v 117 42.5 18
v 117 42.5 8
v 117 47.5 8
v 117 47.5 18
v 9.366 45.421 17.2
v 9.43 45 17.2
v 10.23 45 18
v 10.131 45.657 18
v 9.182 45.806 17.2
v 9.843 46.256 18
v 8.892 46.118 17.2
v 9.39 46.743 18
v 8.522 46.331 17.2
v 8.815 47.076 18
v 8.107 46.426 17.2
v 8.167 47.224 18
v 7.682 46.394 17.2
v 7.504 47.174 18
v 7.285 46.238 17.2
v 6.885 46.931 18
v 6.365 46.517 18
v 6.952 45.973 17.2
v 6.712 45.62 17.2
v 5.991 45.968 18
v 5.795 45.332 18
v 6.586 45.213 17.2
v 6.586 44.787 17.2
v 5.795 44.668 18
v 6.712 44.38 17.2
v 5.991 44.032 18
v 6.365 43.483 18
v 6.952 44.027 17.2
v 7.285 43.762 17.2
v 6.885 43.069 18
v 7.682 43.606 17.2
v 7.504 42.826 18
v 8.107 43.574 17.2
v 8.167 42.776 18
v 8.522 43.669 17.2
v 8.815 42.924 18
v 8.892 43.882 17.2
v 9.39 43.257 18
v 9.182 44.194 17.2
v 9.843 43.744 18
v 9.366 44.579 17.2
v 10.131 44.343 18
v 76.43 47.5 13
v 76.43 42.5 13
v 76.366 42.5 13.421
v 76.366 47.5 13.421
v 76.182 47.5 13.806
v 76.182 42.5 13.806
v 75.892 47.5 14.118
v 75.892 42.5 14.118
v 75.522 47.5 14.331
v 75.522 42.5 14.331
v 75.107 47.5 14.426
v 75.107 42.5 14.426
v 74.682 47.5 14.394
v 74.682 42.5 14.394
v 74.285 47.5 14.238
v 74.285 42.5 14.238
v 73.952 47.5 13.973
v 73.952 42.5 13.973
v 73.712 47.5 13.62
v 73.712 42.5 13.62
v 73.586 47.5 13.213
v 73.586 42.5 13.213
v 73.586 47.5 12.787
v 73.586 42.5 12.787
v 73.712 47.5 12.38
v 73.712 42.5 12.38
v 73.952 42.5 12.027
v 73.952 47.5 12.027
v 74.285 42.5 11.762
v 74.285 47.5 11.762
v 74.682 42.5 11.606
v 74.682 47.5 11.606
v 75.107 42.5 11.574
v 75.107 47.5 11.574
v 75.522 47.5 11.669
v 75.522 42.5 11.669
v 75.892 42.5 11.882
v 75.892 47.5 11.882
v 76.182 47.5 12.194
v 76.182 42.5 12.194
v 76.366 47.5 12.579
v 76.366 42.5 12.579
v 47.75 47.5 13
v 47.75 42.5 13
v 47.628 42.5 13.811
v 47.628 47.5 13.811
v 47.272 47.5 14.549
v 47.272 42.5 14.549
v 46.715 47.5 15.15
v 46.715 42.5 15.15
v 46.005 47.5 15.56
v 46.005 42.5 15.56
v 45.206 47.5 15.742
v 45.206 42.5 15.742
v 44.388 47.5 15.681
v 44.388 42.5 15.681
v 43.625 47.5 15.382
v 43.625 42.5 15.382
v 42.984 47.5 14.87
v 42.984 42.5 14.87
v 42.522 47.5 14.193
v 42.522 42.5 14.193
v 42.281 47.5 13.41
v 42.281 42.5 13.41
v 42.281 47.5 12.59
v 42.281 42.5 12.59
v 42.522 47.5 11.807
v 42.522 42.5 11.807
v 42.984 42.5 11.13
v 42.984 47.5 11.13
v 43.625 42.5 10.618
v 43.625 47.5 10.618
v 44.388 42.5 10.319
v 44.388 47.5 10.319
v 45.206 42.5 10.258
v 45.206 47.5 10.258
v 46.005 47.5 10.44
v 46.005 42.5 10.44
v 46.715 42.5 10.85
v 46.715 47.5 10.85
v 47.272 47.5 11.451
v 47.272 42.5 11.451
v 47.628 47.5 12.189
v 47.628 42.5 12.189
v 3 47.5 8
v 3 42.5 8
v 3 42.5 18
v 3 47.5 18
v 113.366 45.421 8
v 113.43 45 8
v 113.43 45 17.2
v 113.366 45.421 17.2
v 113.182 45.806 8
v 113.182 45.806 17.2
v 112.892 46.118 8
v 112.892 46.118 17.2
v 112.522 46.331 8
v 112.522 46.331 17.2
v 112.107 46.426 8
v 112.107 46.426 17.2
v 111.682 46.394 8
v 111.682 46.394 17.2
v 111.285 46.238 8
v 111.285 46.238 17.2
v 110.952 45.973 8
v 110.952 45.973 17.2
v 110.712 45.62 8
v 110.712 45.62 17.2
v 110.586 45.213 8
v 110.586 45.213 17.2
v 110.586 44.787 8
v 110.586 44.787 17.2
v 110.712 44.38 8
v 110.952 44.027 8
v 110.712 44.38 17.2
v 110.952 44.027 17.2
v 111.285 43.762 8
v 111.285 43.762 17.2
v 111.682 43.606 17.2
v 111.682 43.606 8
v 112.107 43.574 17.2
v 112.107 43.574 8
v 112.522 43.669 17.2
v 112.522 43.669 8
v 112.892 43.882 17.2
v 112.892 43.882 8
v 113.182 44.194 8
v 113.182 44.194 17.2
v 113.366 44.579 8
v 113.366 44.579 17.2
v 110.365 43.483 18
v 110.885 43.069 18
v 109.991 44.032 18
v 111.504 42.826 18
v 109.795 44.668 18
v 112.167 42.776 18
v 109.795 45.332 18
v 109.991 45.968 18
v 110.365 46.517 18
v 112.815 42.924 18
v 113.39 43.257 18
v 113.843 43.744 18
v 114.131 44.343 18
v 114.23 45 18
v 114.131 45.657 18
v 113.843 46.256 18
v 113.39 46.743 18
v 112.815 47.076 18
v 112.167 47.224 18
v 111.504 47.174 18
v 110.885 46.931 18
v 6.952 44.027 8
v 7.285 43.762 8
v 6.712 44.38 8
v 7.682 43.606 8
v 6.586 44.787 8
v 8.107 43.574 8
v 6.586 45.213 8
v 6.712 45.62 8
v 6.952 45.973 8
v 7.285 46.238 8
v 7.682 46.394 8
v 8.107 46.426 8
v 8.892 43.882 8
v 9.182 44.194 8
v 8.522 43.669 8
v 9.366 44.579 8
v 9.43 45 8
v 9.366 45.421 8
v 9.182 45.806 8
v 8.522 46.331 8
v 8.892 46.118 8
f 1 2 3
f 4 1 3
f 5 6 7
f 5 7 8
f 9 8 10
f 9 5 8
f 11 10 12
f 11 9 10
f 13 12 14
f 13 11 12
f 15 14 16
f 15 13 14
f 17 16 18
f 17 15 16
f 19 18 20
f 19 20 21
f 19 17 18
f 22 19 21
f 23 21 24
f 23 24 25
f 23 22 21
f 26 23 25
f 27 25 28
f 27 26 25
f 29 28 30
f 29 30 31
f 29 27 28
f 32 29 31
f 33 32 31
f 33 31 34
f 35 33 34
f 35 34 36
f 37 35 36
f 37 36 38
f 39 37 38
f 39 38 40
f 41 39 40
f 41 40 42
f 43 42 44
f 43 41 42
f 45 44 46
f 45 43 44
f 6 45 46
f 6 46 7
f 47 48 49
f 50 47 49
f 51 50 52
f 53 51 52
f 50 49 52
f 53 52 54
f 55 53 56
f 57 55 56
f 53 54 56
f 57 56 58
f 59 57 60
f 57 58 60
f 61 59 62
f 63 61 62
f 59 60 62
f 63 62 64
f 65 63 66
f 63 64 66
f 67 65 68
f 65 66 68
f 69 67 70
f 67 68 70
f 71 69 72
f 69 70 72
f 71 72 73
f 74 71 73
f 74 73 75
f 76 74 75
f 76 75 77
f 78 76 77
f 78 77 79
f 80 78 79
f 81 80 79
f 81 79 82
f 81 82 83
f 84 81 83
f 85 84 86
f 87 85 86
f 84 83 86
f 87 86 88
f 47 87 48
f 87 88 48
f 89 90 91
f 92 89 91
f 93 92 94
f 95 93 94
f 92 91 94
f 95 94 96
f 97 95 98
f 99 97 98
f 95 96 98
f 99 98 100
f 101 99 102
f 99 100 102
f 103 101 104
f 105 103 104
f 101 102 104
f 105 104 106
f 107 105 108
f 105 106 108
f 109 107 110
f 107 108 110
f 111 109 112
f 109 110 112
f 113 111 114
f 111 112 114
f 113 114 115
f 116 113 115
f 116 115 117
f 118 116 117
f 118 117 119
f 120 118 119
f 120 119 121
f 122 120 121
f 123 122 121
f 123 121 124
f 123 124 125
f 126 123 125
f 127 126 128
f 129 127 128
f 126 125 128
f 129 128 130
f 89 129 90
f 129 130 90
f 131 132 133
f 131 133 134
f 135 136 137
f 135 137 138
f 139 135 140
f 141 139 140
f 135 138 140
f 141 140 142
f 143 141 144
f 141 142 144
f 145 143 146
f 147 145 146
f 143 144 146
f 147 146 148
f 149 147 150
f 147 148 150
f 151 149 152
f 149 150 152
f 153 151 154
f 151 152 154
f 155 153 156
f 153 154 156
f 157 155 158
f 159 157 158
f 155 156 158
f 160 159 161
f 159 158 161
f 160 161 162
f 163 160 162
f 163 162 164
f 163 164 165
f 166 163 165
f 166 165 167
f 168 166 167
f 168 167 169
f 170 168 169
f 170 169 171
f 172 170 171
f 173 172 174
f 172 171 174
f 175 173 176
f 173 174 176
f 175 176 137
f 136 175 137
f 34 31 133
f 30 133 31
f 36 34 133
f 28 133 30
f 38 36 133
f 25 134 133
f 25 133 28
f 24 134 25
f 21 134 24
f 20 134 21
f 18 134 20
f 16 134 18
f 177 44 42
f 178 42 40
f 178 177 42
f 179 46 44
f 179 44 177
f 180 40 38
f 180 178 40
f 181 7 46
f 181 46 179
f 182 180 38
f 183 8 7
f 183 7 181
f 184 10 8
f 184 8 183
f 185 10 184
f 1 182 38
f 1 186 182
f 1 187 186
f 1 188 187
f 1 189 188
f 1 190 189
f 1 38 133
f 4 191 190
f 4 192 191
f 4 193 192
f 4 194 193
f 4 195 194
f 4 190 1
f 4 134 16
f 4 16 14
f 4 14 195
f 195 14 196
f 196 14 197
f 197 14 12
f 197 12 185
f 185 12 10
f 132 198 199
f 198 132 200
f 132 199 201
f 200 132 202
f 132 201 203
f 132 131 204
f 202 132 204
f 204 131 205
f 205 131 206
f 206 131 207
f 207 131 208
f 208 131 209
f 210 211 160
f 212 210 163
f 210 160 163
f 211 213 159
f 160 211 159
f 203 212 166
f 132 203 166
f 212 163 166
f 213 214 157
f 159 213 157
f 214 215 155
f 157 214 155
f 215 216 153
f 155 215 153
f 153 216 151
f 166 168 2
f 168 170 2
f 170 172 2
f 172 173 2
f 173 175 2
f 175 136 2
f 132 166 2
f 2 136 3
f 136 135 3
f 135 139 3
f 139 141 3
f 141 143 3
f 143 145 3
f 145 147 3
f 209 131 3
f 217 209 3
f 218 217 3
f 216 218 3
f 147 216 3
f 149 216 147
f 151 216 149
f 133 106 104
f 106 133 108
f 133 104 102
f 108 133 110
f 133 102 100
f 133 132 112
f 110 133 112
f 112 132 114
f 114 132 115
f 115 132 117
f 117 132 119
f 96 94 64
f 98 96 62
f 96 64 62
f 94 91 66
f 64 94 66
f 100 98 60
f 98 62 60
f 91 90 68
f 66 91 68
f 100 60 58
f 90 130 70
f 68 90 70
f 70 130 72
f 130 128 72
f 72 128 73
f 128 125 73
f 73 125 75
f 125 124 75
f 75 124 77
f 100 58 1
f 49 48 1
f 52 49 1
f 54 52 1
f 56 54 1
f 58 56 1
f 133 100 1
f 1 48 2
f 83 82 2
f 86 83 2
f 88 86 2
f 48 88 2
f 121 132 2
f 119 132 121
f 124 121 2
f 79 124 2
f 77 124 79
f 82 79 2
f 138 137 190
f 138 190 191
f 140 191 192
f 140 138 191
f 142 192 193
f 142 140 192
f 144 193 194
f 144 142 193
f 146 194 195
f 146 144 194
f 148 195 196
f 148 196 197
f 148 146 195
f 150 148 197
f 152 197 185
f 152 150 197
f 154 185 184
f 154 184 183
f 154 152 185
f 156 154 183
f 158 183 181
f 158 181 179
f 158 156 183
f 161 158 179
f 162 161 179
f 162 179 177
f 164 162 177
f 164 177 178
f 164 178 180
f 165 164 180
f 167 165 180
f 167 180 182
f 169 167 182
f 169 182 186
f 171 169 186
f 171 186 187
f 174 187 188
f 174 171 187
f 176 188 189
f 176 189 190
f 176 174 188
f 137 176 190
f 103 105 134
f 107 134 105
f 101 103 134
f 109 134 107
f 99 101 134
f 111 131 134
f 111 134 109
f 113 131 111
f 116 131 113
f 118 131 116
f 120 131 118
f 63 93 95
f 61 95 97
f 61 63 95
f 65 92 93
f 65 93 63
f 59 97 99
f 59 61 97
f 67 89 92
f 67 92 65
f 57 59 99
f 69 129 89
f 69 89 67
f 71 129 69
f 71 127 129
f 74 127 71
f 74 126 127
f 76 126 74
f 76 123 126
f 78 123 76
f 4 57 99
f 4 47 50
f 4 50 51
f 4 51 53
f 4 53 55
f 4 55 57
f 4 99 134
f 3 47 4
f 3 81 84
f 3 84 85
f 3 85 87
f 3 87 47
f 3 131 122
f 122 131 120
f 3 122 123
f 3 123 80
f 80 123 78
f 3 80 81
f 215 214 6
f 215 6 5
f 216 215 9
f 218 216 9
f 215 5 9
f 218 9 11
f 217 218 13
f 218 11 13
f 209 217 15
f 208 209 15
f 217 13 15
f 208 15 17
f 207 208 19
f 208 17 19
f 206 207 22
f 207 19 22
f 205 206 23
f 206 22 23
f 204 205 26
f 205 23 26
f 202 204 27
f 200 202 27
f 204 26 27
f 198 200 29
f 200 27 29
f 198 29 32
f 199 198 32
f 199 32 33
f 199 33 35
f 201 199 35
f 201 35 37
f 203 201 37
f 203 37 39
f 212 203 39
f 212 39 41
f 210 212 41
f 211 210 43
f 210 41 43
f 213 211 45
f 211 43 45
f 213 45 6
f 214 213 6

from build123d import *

# Parameters (mm, degrees)
SKETCH004_W     = 114
SKETCH004_H     = 5
PAD001_DEPTH    = 10
SKETCH005_R     = 1.43
POCKET003_DEPTH = 10
CHAMFER_SIZE    = 0.8
SKETCH009_R     = 2.75
SKETCH009_R_2   = 1.43
POCKET006_DEPTH = 5


with BuildPart() as part:
    # Sketch004 → Pad001 (new body)
    with BuildSketch(Plane.XY):
        with Locations((60, 45)):
            Rectangle(SKETCH004_W, SKETCH004_H)
    extrude(amount=PAD001_DEPTH)

    # Sketch005 (on Face6 of Pad001) → Pocket003 (cut)
    with BuildSketch(Plane.XY.offset(10)):
        with Locations((8, 45)):
            Circle(SKETCH005_R)
        with Locations((112, 45)):
            Circle(SKETCH005_R)
    extrude(amount=-POCKET003_DEPTH, mode=Mode.SUBTRACT)

    # Chamfer
    chamfer_edges = [part.edges().sort_by_distance(p)[0] for p in [
        (110.57, 45, 10),
        (6.57, 45, 10),
    ]]
    chamfer(chamfer_edges, length=CHAMFER_SIZE)

    # Sketch009 (on Face6 of Chamfer) → Pocket006 (cut)
    with BuildSketch(Plane.XZ.offset(-42.5)):
        with Locations((45, 5)):
            Circle(SKETCH009_R)
        with Locations((75, 5)):
            Circle(SKETCH009_R_2)
    extrude(amount=-POCKET006_DEPTH, mode=Mode.SUBTRACT)


with BuildPart() as part_1:
    # Body001 placement: moved
    add(part.part.moved(Location((0, 0, 8))))


solid = part_1.part
